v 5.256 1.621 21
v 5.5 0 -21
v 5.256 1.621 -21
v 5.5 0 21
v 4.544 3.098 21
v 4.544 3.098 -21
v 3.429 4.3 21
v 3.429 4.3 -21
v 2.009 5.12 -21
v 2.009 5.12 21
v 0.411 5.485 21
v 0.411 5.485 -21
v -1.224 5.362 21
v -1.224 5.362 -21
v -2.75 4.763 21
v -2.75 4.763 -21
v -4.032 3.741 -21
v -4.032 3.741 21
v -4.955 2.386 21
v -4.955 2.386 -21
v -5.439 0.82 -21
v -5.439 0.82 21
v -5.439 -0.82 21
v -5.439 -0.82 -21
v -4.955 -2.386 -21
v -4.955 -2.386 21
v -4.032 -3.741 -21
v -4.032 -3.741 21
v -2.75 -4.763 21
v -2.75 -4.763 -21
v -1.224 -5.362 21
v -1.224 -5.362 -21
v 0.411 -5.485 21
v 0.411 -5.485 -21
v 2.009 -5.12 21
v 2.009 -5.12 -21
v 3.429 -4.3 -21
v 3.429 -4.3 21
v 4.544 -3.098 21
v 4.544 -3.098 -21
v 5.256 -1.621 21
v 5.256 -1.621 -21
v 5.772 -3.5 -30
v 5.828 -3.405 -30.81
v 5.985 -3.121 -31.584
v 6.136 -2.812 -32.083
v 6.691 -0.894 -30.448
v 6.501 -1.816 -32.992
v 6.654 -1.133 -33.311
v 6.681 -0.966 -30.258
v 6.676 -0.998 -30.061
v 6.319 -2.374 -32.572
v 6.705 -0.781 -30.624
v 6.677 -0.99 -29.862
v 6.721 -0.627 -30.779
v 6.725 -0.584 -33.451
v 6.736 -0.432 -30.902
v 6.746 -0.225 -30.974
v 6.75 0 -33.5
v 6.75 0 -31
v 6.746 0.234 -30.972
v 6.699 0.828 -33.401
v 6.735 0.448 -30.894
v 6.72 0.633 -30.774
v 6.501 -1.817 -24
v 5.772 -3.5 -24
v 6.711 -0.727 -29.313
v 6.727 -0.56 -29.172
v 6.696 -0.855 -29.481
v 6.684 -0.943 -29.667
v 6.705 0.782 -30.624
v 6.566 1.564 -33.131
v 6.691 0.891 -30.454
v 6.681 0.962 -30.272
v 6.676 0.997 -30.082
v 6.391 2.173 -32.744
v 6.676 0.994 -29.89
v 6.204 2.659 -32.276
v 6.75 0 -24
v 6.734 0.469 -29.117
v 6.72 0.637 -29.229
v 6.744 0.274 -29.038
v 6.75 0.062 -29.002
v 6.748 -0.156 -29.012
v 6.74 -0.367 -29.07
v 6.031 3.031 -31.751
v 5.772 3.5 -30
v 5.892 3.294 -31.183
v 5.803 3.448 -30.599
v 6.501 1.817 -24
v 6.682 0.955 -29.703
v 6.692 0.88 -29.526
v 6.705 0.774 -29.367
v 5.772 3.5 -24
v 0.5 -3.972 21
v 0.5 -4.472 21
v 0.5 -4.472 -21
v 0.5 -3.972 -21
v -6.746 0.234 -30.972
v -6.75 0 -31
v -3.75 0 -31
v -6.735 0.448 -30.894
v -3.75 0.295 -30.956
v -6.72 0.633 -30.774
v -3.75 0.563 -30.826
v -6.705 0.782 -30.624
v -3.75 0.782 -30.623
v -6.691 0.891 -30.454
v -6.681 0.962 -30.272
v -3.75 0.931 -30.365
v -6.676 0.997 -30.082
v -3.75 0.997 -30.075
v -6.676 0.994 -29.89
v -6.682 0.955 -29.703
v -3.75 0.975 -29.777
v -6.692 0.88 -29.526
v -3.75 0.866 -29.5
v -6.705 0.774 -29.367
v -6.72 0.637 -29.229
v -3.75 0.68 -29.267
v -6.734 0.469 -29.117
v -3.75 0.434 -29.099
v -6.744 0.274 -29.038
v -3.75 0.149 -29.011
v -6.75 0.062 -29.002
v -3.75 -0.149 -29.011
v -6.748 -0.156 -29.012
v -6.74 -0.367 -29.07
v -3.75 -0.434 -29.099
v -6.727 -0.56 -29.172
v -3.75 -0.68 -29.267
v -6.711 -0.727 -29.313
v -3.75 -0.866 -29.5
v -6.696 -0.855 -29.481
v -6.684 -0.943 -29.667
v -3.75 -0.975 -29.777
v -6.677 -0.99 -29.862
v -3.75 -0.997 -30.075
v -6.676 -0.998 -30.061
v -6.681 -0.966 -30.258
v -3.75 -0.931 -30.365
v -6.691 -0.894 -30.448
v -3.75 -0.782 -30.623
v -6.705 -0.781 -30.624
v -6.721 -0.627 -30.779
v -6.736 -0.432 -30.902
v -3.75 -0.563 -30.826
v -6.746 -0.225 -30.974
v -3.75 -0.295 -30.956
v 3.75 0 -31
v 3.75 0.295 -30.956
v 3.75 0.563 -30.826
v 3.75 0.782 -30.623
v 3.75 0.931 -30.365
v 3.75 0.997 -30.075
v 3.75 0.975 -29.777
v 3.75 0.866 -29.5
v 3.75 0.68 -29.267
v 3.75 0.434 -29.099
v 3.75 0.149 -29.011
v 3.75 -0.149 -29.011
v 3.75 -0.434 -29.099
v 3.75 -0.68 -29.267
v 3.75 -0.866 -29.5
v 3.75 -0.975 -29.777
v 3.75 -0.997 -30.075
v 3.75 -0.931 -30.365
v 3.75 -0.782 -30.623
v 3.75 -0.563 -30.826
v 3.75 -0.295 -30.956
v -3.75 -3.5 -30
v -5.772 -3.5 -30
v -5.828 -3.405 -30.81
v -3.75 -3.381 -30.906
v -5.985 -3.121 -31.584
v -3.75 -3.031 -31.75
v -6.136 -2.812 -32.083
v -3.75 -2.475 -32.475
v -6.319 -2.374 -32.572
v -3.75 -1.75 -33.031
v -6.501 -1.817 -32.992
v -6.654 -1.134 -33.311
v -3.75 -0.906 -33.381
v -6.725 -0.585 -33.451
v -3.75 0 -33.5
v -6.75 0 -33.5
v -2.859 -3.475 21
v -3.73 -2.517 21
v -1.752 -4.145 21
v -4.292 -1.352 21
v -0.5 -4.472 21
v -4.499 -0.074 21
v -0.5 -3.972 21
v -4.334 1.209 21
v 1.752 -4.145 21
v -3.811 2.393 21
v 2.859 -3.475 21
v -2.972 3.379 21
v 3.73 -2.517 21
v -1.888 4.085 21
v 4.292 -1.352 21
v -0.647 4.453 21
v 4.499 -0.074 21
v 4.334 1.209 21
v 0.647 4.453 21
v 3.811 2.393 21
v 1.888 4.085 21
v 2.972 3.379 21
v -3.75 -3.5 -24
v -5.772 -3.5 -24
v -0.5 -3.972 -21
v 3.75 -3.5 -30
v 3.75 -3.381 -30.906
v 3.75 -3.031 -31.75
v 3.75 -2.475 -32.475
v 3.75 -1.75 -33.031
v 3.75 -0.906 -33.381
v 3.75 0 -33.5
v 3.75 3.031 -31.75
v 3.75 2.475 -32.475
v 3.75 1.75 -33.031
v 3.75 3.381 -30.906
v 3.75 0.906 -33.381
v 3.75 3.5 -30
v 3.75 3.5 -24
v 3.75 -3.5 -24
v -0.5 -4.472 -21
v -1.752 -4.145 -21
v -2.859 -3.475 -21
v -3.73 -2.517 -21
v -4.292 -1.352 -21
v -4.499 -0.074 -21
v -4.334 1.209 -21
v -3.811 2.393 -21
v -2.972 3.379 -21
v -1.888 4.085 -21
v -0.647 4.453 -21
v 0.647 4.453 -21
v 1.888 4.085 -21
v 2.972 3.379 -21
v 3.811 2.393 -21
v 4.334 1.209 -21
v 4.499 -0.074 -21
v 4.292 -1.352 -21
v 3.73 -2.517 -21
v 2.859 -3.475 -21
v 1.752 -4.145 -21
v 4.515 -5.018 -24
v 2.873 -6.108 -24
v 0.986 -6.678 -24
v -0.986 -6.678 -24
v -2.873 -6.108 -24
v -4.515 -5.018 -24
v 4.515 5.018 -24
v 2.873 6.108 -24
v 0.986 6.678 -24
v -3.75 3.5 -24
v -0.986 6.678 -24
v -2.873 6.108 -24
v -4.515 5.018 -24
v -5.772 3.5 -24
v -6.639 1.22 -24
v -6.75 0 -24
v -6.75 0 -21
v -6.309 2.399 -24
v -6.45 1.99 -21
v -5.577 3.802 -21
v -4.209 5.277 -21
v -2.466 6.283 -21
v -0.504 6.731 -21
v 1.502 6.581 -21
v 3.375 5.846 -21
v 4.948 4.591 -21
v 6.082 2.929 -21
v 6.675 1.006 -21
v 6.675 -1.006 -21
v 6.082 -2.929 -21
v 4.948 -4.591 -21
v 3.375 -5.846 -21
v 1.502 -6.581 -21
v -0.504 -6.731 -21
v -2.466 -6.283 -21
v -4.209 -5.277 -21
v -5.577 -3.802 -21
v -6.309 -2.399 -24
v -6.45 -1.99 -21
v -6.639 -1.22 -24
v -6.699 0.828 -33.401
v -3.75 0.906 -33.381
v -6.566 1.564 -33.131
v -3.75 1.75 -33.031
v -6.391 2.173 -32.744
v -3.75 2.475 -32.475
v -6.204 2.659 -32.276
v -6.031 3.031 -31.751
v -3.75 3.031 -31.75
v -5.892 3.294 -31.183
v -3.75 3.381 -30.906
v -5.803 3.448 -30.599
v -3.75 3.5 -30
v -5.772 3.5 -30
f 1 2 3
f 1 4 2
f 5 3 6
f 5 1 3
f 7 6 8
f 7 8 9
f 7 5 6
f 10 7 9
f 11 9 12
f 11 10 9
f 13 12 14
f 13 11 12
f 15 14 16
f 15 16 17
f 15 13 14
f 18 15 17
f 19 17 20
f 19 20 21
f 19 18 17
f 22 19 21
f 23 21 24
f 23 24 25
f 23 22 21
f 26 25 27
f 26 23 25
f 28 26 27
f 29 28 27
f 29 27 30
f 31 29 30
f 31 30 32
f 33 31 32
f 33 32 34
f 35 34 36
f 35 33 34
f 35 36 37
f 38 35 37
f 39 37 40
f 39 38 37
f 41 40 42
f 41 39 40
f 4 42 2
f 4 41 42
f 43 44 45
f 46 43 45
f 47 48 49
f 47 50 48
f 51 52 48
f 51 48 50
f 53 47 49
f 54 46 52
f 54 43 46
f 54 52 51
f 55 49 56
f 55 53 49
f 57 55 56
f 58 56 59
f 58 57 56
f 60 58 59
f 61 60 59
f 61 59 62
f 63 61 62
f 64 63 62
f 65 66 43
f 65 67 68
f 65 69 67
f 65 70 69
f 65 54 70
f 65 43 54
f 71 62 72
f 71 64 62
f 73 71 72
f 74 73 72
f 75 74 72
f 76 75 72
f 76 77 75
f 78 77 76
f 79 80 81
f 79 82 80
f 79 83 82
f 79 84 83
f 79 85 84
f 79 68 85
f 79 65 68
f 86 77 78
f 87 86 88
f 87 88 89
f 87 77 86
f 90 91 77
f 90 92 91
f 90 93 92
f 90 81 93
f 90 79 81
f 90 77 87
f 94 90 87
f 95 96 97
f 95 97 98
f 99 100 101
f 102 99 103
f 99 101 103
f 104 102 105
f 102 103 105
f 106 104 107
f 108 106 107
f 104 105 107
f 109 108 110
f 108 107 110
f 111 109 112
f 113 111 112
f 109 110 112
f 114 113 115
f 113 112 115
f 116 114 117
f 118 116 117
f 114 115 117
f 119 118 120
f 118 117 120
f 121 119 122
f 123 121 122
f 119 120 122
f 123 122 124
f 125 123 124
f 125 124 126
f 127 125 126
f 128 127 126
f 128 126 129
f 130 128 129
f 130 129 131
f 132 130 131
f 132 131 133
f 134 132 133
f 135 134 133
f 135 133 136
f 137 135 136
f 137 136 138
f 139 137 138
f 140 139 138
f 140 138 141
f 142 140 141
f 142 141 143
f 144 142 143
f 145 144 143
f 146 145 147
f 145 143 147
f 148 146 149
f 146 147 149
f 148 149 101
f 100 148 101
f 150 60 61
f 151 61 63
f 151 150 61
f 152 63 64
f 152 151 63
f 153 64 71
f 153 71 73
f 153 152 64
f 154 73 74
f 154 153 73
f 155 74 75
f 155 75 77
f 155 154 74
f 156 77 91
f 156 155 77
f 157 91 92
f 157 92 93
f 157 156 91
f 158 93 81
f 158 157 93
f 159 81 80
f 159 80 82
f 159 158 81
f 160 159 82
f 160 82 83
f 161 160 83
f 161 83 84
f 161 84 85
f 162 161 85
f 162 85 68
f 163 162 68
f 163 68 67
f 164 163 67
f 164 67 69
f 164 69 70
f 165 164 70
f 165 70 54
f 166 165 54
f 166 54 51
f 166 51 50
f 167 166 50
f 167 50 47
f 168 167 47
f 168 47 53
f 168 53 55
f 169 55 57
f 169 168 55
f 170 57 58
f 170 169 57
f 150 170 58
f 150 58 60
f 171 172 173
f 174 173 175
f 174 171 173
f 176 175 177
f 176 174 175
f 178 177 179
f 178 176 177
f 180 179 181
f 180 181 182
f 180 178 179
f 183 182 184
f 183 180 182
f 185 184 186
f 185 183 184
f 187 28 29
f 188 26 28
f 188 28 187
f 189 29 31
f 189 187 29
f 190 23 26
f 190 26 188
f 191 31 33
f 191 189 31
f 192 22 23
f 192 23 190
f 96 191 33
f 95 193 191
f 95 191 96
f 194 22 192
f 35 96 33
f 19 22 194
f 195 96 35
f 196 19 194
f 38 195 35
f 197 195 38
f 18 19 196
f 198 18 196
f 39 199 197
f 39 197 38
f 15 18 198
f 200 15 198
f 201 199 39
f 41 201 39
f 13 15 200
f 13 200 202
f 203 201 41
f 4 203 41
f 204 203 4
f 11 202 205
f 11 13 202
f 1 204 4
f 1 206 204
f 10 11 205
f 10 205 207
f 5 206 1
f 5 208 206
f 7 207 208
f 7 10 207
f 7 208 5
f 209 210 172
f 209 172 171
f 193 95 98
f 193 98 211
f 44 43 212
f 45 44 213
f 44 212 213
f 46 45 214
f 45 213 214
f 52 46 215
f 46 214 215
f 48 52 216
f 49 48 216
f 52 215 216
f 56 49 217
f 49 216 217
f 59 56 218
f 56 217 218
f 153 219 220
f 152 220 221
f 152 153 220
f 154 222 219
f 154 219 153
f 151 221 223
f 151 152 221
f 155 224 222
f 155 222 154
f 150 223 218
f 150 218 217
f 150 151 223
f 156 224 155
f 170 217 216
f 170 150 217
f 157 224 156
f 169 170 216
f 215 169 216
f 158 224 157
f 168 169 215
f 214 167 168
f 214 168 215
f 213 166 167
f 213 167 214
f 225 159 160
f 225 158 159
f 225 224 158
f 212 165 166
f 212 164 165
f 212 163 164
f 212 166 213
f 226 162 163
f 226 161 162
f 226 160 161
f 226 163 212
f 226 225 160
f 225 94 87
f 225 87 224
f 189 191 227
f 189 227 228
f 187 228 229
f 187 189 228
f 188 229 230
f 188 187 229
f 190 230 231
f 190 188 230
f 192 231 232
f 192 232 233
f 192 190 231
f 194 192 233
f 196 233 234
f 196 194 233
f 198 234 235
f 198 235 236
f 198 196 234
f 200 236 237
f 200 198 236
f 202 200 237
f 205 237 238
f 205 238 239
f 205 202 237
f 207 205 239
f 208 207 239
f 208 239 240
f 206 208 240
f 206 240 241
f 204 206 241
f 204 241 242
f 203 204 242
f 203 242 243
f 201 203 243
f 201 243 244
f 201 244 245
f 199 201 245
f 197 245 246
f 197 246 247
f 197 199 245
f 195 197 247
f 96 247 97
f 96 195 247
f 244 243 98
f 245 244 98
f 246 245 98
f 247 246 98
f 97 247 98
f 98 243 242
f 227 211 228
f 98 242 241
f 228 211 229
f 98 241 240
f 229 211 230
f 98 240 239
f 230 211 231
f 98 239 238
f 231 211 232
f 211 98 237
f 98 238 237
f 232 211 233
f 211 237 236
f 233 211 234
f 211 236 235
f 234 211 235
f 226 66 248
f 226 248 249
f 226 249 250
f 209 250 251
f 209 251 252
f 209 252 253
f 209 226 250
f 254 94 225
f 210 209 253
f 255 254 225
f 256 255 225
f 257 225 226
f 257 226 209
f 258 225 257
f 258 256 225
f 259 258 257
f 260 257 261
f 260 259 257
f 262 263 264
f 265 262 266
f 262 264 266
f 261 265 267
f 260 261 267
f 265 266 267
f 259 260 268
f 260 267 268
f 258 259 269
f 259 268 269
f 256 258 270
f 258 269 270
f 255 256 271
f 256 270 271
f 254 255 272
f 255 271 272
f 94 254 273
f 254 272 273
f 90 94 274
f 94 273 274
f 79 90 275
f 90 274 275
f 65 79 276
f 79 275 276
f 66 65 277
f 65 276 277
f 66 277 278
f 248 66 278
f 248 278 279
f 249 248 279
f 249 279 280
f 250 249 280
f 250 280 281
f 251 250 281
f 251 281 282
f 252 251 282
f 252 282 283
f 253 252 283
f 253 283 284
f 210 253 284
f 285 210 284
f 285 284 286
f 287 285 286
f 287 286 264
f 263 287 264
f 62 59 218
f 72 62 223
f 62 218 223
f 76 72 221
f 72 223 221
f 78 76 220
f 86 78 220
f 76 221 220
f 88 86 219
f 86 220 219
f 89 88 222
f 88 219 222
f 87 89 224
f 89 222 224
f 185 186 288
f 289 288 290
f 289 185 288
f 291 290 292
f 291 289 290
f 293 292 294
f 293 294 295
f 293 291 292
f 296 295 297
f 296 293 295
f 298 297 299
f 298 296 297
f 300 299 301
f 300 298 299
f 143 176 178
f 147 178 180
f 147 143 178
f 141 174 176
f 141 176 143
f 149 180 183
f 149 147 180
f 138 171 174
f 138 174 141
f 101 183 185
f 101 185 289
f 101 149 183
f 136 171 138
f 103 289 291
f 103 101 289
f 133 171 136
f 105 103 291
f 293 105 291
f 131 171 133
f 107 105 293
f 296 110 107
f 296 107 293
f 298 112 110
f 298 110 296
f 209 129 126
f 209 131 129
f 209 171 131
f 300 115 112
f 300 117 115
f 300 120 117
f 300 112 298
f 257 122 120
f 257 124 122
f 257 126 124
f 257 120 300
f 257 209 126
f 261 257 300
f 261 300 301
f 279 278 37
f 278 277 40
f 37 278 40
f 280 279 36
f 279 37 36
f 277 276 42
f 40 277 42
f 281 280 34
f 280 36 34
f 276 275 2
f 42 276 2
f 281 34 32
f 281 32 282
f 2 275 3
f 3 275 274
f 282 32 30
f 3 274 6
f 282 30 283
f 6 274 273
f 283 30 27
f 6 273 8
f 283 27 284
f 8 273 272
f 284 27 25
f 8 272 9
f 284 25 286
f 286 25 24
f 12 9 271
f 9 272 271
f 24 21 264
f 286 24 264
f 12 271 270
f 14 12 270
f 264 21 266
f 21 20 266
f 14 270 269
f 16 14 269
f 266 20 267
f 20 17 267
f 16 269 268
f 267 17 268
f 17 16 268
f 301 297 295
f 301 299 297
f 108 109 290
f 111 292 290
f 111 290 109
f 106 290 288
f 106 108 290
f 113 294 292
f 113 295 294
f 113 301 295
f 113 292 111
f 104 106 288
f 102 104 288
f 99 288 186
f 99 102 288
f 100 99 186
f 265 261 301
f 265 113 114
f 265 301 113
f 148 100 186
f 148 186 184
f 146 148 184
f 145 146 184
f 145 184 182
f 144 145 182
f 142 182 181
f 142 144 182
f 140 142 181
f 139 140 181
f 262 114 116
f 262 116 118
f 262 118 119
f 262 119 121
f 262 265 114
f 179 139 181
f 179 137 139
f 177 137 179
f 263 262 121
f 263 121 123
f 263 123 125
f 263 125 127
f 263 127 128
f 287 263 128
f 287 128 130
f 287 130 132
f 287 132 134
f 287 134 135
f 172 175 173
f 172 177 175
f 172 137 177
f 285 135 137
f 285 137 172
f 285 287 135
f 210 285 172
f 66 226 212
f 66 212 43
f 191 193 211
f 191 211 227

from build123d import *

# Parameters (mm, degrees)
SKETCH1_R                = 5.5
YOKE_DEPTH               = 21
SKETCH2_R                = 6.75
U_JOINT_BASE_DEPTH       = 3
U_JOINT_STANDUPS_DEPTH   = 9.5
STANDUP_ROUND_DEPTH      = 7.75
STANDUP_ROUND_DEPTH_BACK = 7.75
SKETCH5_R                = 1
BALL_HOLES_DEPTH         = 7.75
BALL_HOLES_DEPTH_BACK    = 7.75
KEYWAY_DEPTH             = 42


with BuildPart() as part:
    # Sketch1 → Yoke (new body, symmetric)
    with BuildSketch(Plane.XY):
        Circle(SKETCH1_R)
    extrude(amount=YOKE_DEPTH, both=True)

    # Sketch2 → U Joint Base (add)
    with BuildSketch(Plane(origin=(0, 0, -21), x_dir=(-1, 0, 0), z_dir=(0, 0, -1))):
        Circle(SKETCH2_R)
    extrude(amount=U_JOINT_BASE_DEPTH)

    # Sketch3 → U Joint Standups (add)
    with BuildSketch(Plane(origin=(0, 0, -24), x_dir=(-1, 0, 0), z_dir=(0, 0, -1))):
        with BuildLine():
            Line((-5.771698, 3.5), (-3.75, 3.5))
            Line((-3.75, 3.5), (-3.75, -3.5))
            Line((-3.75, -3.5), (-5.771698, -3.5))
            ThreePointArc((-5.771698, -3.5), (-6.75, 0), (-5.771698, 3.5))
        make_face()
        with BuildLine():
            Line((3.75, -3.5), (3.75, 3.5))
            Line((3.75, 3.5), (5.771698, 3.5))
            ThreePointArc((5.771698, 3.5), (6.75, 0), (5.771698, -3.5))
            Line((5.771698, -3.5), (3.75, -3.5))
        make_face()
    extrude(amount=U_JOINT_STANDUPS_DEPTH)

    # Sketch4 → Standup Round (cut, two sides)
    with BuildSketch(Plane(origin=(0, 0, 0), x_dir=(0, 0, -1), z_dir=(1, 0, 0))) as standup_round_sk:
        with BuildLine():
            ThreePointArc((30, -3.5), (32.474874, -2.474874), (33.5, 0))
            Line((33.5, 0), (33.5, -3.5))
            Line((33.5, -3.5), (30, -3.5))
        make_face()
        with BuildLine():
            ThreePointArc((33.5, 0), (32.474874, 2.474874), (30, 3.5))
            Line((30, 3.5), (33.5, 3.5))
            Line((33.5, 3.5), (33.5, 0))
        make_face()
    extrude(amount=STANDUP_ROUND_DEPTH, mode=Mode.SUBTRACT)
    extrude(standup_round_sk.sketch, amount=-STANDUP_ROUND_DEPTH_BACK, mode=Mode.SUBTRACT)

    # Sketch5 → Ball Holes (cut, two sides)
    with BuildSketch(Plane(origin=(0, 0, 0), x_dir=(0, 0, -1), z_dir=(1, 0, 0))) as ball_holes_sk:
        with Locations((30, 0)):
            Circle(SKETCH5_R)
    extrude(amount=BALL_HOLES_DEPTH, mode=Mode.SUBTRACT)
    extrude(ball_holes_sk.sketch, amount=-BALL_HOLES_DEPTH_BACK, mode=Mode.SUBTRACT)

    # Sketch6 → Keyway (cut)
    with BuildSketch(Plane.XY.offset(21)):
        with BuildLine():
            Line((0.5, -4.472136), (0.5, -3.972136))
            Line((0.5, -3.972136), (-0.5, -3.972136))
            Line((-0.5, -3.972136), (-0.5, -4.472136))
            ThreePointArc((-0.5, -4.472136), (0, 4.5), (0.5, -4.472136))
        make_face()
    extrude(amount=-KEYWAY_DEPTH, mode=Mode.SUBTRACT)


solid = part.part
